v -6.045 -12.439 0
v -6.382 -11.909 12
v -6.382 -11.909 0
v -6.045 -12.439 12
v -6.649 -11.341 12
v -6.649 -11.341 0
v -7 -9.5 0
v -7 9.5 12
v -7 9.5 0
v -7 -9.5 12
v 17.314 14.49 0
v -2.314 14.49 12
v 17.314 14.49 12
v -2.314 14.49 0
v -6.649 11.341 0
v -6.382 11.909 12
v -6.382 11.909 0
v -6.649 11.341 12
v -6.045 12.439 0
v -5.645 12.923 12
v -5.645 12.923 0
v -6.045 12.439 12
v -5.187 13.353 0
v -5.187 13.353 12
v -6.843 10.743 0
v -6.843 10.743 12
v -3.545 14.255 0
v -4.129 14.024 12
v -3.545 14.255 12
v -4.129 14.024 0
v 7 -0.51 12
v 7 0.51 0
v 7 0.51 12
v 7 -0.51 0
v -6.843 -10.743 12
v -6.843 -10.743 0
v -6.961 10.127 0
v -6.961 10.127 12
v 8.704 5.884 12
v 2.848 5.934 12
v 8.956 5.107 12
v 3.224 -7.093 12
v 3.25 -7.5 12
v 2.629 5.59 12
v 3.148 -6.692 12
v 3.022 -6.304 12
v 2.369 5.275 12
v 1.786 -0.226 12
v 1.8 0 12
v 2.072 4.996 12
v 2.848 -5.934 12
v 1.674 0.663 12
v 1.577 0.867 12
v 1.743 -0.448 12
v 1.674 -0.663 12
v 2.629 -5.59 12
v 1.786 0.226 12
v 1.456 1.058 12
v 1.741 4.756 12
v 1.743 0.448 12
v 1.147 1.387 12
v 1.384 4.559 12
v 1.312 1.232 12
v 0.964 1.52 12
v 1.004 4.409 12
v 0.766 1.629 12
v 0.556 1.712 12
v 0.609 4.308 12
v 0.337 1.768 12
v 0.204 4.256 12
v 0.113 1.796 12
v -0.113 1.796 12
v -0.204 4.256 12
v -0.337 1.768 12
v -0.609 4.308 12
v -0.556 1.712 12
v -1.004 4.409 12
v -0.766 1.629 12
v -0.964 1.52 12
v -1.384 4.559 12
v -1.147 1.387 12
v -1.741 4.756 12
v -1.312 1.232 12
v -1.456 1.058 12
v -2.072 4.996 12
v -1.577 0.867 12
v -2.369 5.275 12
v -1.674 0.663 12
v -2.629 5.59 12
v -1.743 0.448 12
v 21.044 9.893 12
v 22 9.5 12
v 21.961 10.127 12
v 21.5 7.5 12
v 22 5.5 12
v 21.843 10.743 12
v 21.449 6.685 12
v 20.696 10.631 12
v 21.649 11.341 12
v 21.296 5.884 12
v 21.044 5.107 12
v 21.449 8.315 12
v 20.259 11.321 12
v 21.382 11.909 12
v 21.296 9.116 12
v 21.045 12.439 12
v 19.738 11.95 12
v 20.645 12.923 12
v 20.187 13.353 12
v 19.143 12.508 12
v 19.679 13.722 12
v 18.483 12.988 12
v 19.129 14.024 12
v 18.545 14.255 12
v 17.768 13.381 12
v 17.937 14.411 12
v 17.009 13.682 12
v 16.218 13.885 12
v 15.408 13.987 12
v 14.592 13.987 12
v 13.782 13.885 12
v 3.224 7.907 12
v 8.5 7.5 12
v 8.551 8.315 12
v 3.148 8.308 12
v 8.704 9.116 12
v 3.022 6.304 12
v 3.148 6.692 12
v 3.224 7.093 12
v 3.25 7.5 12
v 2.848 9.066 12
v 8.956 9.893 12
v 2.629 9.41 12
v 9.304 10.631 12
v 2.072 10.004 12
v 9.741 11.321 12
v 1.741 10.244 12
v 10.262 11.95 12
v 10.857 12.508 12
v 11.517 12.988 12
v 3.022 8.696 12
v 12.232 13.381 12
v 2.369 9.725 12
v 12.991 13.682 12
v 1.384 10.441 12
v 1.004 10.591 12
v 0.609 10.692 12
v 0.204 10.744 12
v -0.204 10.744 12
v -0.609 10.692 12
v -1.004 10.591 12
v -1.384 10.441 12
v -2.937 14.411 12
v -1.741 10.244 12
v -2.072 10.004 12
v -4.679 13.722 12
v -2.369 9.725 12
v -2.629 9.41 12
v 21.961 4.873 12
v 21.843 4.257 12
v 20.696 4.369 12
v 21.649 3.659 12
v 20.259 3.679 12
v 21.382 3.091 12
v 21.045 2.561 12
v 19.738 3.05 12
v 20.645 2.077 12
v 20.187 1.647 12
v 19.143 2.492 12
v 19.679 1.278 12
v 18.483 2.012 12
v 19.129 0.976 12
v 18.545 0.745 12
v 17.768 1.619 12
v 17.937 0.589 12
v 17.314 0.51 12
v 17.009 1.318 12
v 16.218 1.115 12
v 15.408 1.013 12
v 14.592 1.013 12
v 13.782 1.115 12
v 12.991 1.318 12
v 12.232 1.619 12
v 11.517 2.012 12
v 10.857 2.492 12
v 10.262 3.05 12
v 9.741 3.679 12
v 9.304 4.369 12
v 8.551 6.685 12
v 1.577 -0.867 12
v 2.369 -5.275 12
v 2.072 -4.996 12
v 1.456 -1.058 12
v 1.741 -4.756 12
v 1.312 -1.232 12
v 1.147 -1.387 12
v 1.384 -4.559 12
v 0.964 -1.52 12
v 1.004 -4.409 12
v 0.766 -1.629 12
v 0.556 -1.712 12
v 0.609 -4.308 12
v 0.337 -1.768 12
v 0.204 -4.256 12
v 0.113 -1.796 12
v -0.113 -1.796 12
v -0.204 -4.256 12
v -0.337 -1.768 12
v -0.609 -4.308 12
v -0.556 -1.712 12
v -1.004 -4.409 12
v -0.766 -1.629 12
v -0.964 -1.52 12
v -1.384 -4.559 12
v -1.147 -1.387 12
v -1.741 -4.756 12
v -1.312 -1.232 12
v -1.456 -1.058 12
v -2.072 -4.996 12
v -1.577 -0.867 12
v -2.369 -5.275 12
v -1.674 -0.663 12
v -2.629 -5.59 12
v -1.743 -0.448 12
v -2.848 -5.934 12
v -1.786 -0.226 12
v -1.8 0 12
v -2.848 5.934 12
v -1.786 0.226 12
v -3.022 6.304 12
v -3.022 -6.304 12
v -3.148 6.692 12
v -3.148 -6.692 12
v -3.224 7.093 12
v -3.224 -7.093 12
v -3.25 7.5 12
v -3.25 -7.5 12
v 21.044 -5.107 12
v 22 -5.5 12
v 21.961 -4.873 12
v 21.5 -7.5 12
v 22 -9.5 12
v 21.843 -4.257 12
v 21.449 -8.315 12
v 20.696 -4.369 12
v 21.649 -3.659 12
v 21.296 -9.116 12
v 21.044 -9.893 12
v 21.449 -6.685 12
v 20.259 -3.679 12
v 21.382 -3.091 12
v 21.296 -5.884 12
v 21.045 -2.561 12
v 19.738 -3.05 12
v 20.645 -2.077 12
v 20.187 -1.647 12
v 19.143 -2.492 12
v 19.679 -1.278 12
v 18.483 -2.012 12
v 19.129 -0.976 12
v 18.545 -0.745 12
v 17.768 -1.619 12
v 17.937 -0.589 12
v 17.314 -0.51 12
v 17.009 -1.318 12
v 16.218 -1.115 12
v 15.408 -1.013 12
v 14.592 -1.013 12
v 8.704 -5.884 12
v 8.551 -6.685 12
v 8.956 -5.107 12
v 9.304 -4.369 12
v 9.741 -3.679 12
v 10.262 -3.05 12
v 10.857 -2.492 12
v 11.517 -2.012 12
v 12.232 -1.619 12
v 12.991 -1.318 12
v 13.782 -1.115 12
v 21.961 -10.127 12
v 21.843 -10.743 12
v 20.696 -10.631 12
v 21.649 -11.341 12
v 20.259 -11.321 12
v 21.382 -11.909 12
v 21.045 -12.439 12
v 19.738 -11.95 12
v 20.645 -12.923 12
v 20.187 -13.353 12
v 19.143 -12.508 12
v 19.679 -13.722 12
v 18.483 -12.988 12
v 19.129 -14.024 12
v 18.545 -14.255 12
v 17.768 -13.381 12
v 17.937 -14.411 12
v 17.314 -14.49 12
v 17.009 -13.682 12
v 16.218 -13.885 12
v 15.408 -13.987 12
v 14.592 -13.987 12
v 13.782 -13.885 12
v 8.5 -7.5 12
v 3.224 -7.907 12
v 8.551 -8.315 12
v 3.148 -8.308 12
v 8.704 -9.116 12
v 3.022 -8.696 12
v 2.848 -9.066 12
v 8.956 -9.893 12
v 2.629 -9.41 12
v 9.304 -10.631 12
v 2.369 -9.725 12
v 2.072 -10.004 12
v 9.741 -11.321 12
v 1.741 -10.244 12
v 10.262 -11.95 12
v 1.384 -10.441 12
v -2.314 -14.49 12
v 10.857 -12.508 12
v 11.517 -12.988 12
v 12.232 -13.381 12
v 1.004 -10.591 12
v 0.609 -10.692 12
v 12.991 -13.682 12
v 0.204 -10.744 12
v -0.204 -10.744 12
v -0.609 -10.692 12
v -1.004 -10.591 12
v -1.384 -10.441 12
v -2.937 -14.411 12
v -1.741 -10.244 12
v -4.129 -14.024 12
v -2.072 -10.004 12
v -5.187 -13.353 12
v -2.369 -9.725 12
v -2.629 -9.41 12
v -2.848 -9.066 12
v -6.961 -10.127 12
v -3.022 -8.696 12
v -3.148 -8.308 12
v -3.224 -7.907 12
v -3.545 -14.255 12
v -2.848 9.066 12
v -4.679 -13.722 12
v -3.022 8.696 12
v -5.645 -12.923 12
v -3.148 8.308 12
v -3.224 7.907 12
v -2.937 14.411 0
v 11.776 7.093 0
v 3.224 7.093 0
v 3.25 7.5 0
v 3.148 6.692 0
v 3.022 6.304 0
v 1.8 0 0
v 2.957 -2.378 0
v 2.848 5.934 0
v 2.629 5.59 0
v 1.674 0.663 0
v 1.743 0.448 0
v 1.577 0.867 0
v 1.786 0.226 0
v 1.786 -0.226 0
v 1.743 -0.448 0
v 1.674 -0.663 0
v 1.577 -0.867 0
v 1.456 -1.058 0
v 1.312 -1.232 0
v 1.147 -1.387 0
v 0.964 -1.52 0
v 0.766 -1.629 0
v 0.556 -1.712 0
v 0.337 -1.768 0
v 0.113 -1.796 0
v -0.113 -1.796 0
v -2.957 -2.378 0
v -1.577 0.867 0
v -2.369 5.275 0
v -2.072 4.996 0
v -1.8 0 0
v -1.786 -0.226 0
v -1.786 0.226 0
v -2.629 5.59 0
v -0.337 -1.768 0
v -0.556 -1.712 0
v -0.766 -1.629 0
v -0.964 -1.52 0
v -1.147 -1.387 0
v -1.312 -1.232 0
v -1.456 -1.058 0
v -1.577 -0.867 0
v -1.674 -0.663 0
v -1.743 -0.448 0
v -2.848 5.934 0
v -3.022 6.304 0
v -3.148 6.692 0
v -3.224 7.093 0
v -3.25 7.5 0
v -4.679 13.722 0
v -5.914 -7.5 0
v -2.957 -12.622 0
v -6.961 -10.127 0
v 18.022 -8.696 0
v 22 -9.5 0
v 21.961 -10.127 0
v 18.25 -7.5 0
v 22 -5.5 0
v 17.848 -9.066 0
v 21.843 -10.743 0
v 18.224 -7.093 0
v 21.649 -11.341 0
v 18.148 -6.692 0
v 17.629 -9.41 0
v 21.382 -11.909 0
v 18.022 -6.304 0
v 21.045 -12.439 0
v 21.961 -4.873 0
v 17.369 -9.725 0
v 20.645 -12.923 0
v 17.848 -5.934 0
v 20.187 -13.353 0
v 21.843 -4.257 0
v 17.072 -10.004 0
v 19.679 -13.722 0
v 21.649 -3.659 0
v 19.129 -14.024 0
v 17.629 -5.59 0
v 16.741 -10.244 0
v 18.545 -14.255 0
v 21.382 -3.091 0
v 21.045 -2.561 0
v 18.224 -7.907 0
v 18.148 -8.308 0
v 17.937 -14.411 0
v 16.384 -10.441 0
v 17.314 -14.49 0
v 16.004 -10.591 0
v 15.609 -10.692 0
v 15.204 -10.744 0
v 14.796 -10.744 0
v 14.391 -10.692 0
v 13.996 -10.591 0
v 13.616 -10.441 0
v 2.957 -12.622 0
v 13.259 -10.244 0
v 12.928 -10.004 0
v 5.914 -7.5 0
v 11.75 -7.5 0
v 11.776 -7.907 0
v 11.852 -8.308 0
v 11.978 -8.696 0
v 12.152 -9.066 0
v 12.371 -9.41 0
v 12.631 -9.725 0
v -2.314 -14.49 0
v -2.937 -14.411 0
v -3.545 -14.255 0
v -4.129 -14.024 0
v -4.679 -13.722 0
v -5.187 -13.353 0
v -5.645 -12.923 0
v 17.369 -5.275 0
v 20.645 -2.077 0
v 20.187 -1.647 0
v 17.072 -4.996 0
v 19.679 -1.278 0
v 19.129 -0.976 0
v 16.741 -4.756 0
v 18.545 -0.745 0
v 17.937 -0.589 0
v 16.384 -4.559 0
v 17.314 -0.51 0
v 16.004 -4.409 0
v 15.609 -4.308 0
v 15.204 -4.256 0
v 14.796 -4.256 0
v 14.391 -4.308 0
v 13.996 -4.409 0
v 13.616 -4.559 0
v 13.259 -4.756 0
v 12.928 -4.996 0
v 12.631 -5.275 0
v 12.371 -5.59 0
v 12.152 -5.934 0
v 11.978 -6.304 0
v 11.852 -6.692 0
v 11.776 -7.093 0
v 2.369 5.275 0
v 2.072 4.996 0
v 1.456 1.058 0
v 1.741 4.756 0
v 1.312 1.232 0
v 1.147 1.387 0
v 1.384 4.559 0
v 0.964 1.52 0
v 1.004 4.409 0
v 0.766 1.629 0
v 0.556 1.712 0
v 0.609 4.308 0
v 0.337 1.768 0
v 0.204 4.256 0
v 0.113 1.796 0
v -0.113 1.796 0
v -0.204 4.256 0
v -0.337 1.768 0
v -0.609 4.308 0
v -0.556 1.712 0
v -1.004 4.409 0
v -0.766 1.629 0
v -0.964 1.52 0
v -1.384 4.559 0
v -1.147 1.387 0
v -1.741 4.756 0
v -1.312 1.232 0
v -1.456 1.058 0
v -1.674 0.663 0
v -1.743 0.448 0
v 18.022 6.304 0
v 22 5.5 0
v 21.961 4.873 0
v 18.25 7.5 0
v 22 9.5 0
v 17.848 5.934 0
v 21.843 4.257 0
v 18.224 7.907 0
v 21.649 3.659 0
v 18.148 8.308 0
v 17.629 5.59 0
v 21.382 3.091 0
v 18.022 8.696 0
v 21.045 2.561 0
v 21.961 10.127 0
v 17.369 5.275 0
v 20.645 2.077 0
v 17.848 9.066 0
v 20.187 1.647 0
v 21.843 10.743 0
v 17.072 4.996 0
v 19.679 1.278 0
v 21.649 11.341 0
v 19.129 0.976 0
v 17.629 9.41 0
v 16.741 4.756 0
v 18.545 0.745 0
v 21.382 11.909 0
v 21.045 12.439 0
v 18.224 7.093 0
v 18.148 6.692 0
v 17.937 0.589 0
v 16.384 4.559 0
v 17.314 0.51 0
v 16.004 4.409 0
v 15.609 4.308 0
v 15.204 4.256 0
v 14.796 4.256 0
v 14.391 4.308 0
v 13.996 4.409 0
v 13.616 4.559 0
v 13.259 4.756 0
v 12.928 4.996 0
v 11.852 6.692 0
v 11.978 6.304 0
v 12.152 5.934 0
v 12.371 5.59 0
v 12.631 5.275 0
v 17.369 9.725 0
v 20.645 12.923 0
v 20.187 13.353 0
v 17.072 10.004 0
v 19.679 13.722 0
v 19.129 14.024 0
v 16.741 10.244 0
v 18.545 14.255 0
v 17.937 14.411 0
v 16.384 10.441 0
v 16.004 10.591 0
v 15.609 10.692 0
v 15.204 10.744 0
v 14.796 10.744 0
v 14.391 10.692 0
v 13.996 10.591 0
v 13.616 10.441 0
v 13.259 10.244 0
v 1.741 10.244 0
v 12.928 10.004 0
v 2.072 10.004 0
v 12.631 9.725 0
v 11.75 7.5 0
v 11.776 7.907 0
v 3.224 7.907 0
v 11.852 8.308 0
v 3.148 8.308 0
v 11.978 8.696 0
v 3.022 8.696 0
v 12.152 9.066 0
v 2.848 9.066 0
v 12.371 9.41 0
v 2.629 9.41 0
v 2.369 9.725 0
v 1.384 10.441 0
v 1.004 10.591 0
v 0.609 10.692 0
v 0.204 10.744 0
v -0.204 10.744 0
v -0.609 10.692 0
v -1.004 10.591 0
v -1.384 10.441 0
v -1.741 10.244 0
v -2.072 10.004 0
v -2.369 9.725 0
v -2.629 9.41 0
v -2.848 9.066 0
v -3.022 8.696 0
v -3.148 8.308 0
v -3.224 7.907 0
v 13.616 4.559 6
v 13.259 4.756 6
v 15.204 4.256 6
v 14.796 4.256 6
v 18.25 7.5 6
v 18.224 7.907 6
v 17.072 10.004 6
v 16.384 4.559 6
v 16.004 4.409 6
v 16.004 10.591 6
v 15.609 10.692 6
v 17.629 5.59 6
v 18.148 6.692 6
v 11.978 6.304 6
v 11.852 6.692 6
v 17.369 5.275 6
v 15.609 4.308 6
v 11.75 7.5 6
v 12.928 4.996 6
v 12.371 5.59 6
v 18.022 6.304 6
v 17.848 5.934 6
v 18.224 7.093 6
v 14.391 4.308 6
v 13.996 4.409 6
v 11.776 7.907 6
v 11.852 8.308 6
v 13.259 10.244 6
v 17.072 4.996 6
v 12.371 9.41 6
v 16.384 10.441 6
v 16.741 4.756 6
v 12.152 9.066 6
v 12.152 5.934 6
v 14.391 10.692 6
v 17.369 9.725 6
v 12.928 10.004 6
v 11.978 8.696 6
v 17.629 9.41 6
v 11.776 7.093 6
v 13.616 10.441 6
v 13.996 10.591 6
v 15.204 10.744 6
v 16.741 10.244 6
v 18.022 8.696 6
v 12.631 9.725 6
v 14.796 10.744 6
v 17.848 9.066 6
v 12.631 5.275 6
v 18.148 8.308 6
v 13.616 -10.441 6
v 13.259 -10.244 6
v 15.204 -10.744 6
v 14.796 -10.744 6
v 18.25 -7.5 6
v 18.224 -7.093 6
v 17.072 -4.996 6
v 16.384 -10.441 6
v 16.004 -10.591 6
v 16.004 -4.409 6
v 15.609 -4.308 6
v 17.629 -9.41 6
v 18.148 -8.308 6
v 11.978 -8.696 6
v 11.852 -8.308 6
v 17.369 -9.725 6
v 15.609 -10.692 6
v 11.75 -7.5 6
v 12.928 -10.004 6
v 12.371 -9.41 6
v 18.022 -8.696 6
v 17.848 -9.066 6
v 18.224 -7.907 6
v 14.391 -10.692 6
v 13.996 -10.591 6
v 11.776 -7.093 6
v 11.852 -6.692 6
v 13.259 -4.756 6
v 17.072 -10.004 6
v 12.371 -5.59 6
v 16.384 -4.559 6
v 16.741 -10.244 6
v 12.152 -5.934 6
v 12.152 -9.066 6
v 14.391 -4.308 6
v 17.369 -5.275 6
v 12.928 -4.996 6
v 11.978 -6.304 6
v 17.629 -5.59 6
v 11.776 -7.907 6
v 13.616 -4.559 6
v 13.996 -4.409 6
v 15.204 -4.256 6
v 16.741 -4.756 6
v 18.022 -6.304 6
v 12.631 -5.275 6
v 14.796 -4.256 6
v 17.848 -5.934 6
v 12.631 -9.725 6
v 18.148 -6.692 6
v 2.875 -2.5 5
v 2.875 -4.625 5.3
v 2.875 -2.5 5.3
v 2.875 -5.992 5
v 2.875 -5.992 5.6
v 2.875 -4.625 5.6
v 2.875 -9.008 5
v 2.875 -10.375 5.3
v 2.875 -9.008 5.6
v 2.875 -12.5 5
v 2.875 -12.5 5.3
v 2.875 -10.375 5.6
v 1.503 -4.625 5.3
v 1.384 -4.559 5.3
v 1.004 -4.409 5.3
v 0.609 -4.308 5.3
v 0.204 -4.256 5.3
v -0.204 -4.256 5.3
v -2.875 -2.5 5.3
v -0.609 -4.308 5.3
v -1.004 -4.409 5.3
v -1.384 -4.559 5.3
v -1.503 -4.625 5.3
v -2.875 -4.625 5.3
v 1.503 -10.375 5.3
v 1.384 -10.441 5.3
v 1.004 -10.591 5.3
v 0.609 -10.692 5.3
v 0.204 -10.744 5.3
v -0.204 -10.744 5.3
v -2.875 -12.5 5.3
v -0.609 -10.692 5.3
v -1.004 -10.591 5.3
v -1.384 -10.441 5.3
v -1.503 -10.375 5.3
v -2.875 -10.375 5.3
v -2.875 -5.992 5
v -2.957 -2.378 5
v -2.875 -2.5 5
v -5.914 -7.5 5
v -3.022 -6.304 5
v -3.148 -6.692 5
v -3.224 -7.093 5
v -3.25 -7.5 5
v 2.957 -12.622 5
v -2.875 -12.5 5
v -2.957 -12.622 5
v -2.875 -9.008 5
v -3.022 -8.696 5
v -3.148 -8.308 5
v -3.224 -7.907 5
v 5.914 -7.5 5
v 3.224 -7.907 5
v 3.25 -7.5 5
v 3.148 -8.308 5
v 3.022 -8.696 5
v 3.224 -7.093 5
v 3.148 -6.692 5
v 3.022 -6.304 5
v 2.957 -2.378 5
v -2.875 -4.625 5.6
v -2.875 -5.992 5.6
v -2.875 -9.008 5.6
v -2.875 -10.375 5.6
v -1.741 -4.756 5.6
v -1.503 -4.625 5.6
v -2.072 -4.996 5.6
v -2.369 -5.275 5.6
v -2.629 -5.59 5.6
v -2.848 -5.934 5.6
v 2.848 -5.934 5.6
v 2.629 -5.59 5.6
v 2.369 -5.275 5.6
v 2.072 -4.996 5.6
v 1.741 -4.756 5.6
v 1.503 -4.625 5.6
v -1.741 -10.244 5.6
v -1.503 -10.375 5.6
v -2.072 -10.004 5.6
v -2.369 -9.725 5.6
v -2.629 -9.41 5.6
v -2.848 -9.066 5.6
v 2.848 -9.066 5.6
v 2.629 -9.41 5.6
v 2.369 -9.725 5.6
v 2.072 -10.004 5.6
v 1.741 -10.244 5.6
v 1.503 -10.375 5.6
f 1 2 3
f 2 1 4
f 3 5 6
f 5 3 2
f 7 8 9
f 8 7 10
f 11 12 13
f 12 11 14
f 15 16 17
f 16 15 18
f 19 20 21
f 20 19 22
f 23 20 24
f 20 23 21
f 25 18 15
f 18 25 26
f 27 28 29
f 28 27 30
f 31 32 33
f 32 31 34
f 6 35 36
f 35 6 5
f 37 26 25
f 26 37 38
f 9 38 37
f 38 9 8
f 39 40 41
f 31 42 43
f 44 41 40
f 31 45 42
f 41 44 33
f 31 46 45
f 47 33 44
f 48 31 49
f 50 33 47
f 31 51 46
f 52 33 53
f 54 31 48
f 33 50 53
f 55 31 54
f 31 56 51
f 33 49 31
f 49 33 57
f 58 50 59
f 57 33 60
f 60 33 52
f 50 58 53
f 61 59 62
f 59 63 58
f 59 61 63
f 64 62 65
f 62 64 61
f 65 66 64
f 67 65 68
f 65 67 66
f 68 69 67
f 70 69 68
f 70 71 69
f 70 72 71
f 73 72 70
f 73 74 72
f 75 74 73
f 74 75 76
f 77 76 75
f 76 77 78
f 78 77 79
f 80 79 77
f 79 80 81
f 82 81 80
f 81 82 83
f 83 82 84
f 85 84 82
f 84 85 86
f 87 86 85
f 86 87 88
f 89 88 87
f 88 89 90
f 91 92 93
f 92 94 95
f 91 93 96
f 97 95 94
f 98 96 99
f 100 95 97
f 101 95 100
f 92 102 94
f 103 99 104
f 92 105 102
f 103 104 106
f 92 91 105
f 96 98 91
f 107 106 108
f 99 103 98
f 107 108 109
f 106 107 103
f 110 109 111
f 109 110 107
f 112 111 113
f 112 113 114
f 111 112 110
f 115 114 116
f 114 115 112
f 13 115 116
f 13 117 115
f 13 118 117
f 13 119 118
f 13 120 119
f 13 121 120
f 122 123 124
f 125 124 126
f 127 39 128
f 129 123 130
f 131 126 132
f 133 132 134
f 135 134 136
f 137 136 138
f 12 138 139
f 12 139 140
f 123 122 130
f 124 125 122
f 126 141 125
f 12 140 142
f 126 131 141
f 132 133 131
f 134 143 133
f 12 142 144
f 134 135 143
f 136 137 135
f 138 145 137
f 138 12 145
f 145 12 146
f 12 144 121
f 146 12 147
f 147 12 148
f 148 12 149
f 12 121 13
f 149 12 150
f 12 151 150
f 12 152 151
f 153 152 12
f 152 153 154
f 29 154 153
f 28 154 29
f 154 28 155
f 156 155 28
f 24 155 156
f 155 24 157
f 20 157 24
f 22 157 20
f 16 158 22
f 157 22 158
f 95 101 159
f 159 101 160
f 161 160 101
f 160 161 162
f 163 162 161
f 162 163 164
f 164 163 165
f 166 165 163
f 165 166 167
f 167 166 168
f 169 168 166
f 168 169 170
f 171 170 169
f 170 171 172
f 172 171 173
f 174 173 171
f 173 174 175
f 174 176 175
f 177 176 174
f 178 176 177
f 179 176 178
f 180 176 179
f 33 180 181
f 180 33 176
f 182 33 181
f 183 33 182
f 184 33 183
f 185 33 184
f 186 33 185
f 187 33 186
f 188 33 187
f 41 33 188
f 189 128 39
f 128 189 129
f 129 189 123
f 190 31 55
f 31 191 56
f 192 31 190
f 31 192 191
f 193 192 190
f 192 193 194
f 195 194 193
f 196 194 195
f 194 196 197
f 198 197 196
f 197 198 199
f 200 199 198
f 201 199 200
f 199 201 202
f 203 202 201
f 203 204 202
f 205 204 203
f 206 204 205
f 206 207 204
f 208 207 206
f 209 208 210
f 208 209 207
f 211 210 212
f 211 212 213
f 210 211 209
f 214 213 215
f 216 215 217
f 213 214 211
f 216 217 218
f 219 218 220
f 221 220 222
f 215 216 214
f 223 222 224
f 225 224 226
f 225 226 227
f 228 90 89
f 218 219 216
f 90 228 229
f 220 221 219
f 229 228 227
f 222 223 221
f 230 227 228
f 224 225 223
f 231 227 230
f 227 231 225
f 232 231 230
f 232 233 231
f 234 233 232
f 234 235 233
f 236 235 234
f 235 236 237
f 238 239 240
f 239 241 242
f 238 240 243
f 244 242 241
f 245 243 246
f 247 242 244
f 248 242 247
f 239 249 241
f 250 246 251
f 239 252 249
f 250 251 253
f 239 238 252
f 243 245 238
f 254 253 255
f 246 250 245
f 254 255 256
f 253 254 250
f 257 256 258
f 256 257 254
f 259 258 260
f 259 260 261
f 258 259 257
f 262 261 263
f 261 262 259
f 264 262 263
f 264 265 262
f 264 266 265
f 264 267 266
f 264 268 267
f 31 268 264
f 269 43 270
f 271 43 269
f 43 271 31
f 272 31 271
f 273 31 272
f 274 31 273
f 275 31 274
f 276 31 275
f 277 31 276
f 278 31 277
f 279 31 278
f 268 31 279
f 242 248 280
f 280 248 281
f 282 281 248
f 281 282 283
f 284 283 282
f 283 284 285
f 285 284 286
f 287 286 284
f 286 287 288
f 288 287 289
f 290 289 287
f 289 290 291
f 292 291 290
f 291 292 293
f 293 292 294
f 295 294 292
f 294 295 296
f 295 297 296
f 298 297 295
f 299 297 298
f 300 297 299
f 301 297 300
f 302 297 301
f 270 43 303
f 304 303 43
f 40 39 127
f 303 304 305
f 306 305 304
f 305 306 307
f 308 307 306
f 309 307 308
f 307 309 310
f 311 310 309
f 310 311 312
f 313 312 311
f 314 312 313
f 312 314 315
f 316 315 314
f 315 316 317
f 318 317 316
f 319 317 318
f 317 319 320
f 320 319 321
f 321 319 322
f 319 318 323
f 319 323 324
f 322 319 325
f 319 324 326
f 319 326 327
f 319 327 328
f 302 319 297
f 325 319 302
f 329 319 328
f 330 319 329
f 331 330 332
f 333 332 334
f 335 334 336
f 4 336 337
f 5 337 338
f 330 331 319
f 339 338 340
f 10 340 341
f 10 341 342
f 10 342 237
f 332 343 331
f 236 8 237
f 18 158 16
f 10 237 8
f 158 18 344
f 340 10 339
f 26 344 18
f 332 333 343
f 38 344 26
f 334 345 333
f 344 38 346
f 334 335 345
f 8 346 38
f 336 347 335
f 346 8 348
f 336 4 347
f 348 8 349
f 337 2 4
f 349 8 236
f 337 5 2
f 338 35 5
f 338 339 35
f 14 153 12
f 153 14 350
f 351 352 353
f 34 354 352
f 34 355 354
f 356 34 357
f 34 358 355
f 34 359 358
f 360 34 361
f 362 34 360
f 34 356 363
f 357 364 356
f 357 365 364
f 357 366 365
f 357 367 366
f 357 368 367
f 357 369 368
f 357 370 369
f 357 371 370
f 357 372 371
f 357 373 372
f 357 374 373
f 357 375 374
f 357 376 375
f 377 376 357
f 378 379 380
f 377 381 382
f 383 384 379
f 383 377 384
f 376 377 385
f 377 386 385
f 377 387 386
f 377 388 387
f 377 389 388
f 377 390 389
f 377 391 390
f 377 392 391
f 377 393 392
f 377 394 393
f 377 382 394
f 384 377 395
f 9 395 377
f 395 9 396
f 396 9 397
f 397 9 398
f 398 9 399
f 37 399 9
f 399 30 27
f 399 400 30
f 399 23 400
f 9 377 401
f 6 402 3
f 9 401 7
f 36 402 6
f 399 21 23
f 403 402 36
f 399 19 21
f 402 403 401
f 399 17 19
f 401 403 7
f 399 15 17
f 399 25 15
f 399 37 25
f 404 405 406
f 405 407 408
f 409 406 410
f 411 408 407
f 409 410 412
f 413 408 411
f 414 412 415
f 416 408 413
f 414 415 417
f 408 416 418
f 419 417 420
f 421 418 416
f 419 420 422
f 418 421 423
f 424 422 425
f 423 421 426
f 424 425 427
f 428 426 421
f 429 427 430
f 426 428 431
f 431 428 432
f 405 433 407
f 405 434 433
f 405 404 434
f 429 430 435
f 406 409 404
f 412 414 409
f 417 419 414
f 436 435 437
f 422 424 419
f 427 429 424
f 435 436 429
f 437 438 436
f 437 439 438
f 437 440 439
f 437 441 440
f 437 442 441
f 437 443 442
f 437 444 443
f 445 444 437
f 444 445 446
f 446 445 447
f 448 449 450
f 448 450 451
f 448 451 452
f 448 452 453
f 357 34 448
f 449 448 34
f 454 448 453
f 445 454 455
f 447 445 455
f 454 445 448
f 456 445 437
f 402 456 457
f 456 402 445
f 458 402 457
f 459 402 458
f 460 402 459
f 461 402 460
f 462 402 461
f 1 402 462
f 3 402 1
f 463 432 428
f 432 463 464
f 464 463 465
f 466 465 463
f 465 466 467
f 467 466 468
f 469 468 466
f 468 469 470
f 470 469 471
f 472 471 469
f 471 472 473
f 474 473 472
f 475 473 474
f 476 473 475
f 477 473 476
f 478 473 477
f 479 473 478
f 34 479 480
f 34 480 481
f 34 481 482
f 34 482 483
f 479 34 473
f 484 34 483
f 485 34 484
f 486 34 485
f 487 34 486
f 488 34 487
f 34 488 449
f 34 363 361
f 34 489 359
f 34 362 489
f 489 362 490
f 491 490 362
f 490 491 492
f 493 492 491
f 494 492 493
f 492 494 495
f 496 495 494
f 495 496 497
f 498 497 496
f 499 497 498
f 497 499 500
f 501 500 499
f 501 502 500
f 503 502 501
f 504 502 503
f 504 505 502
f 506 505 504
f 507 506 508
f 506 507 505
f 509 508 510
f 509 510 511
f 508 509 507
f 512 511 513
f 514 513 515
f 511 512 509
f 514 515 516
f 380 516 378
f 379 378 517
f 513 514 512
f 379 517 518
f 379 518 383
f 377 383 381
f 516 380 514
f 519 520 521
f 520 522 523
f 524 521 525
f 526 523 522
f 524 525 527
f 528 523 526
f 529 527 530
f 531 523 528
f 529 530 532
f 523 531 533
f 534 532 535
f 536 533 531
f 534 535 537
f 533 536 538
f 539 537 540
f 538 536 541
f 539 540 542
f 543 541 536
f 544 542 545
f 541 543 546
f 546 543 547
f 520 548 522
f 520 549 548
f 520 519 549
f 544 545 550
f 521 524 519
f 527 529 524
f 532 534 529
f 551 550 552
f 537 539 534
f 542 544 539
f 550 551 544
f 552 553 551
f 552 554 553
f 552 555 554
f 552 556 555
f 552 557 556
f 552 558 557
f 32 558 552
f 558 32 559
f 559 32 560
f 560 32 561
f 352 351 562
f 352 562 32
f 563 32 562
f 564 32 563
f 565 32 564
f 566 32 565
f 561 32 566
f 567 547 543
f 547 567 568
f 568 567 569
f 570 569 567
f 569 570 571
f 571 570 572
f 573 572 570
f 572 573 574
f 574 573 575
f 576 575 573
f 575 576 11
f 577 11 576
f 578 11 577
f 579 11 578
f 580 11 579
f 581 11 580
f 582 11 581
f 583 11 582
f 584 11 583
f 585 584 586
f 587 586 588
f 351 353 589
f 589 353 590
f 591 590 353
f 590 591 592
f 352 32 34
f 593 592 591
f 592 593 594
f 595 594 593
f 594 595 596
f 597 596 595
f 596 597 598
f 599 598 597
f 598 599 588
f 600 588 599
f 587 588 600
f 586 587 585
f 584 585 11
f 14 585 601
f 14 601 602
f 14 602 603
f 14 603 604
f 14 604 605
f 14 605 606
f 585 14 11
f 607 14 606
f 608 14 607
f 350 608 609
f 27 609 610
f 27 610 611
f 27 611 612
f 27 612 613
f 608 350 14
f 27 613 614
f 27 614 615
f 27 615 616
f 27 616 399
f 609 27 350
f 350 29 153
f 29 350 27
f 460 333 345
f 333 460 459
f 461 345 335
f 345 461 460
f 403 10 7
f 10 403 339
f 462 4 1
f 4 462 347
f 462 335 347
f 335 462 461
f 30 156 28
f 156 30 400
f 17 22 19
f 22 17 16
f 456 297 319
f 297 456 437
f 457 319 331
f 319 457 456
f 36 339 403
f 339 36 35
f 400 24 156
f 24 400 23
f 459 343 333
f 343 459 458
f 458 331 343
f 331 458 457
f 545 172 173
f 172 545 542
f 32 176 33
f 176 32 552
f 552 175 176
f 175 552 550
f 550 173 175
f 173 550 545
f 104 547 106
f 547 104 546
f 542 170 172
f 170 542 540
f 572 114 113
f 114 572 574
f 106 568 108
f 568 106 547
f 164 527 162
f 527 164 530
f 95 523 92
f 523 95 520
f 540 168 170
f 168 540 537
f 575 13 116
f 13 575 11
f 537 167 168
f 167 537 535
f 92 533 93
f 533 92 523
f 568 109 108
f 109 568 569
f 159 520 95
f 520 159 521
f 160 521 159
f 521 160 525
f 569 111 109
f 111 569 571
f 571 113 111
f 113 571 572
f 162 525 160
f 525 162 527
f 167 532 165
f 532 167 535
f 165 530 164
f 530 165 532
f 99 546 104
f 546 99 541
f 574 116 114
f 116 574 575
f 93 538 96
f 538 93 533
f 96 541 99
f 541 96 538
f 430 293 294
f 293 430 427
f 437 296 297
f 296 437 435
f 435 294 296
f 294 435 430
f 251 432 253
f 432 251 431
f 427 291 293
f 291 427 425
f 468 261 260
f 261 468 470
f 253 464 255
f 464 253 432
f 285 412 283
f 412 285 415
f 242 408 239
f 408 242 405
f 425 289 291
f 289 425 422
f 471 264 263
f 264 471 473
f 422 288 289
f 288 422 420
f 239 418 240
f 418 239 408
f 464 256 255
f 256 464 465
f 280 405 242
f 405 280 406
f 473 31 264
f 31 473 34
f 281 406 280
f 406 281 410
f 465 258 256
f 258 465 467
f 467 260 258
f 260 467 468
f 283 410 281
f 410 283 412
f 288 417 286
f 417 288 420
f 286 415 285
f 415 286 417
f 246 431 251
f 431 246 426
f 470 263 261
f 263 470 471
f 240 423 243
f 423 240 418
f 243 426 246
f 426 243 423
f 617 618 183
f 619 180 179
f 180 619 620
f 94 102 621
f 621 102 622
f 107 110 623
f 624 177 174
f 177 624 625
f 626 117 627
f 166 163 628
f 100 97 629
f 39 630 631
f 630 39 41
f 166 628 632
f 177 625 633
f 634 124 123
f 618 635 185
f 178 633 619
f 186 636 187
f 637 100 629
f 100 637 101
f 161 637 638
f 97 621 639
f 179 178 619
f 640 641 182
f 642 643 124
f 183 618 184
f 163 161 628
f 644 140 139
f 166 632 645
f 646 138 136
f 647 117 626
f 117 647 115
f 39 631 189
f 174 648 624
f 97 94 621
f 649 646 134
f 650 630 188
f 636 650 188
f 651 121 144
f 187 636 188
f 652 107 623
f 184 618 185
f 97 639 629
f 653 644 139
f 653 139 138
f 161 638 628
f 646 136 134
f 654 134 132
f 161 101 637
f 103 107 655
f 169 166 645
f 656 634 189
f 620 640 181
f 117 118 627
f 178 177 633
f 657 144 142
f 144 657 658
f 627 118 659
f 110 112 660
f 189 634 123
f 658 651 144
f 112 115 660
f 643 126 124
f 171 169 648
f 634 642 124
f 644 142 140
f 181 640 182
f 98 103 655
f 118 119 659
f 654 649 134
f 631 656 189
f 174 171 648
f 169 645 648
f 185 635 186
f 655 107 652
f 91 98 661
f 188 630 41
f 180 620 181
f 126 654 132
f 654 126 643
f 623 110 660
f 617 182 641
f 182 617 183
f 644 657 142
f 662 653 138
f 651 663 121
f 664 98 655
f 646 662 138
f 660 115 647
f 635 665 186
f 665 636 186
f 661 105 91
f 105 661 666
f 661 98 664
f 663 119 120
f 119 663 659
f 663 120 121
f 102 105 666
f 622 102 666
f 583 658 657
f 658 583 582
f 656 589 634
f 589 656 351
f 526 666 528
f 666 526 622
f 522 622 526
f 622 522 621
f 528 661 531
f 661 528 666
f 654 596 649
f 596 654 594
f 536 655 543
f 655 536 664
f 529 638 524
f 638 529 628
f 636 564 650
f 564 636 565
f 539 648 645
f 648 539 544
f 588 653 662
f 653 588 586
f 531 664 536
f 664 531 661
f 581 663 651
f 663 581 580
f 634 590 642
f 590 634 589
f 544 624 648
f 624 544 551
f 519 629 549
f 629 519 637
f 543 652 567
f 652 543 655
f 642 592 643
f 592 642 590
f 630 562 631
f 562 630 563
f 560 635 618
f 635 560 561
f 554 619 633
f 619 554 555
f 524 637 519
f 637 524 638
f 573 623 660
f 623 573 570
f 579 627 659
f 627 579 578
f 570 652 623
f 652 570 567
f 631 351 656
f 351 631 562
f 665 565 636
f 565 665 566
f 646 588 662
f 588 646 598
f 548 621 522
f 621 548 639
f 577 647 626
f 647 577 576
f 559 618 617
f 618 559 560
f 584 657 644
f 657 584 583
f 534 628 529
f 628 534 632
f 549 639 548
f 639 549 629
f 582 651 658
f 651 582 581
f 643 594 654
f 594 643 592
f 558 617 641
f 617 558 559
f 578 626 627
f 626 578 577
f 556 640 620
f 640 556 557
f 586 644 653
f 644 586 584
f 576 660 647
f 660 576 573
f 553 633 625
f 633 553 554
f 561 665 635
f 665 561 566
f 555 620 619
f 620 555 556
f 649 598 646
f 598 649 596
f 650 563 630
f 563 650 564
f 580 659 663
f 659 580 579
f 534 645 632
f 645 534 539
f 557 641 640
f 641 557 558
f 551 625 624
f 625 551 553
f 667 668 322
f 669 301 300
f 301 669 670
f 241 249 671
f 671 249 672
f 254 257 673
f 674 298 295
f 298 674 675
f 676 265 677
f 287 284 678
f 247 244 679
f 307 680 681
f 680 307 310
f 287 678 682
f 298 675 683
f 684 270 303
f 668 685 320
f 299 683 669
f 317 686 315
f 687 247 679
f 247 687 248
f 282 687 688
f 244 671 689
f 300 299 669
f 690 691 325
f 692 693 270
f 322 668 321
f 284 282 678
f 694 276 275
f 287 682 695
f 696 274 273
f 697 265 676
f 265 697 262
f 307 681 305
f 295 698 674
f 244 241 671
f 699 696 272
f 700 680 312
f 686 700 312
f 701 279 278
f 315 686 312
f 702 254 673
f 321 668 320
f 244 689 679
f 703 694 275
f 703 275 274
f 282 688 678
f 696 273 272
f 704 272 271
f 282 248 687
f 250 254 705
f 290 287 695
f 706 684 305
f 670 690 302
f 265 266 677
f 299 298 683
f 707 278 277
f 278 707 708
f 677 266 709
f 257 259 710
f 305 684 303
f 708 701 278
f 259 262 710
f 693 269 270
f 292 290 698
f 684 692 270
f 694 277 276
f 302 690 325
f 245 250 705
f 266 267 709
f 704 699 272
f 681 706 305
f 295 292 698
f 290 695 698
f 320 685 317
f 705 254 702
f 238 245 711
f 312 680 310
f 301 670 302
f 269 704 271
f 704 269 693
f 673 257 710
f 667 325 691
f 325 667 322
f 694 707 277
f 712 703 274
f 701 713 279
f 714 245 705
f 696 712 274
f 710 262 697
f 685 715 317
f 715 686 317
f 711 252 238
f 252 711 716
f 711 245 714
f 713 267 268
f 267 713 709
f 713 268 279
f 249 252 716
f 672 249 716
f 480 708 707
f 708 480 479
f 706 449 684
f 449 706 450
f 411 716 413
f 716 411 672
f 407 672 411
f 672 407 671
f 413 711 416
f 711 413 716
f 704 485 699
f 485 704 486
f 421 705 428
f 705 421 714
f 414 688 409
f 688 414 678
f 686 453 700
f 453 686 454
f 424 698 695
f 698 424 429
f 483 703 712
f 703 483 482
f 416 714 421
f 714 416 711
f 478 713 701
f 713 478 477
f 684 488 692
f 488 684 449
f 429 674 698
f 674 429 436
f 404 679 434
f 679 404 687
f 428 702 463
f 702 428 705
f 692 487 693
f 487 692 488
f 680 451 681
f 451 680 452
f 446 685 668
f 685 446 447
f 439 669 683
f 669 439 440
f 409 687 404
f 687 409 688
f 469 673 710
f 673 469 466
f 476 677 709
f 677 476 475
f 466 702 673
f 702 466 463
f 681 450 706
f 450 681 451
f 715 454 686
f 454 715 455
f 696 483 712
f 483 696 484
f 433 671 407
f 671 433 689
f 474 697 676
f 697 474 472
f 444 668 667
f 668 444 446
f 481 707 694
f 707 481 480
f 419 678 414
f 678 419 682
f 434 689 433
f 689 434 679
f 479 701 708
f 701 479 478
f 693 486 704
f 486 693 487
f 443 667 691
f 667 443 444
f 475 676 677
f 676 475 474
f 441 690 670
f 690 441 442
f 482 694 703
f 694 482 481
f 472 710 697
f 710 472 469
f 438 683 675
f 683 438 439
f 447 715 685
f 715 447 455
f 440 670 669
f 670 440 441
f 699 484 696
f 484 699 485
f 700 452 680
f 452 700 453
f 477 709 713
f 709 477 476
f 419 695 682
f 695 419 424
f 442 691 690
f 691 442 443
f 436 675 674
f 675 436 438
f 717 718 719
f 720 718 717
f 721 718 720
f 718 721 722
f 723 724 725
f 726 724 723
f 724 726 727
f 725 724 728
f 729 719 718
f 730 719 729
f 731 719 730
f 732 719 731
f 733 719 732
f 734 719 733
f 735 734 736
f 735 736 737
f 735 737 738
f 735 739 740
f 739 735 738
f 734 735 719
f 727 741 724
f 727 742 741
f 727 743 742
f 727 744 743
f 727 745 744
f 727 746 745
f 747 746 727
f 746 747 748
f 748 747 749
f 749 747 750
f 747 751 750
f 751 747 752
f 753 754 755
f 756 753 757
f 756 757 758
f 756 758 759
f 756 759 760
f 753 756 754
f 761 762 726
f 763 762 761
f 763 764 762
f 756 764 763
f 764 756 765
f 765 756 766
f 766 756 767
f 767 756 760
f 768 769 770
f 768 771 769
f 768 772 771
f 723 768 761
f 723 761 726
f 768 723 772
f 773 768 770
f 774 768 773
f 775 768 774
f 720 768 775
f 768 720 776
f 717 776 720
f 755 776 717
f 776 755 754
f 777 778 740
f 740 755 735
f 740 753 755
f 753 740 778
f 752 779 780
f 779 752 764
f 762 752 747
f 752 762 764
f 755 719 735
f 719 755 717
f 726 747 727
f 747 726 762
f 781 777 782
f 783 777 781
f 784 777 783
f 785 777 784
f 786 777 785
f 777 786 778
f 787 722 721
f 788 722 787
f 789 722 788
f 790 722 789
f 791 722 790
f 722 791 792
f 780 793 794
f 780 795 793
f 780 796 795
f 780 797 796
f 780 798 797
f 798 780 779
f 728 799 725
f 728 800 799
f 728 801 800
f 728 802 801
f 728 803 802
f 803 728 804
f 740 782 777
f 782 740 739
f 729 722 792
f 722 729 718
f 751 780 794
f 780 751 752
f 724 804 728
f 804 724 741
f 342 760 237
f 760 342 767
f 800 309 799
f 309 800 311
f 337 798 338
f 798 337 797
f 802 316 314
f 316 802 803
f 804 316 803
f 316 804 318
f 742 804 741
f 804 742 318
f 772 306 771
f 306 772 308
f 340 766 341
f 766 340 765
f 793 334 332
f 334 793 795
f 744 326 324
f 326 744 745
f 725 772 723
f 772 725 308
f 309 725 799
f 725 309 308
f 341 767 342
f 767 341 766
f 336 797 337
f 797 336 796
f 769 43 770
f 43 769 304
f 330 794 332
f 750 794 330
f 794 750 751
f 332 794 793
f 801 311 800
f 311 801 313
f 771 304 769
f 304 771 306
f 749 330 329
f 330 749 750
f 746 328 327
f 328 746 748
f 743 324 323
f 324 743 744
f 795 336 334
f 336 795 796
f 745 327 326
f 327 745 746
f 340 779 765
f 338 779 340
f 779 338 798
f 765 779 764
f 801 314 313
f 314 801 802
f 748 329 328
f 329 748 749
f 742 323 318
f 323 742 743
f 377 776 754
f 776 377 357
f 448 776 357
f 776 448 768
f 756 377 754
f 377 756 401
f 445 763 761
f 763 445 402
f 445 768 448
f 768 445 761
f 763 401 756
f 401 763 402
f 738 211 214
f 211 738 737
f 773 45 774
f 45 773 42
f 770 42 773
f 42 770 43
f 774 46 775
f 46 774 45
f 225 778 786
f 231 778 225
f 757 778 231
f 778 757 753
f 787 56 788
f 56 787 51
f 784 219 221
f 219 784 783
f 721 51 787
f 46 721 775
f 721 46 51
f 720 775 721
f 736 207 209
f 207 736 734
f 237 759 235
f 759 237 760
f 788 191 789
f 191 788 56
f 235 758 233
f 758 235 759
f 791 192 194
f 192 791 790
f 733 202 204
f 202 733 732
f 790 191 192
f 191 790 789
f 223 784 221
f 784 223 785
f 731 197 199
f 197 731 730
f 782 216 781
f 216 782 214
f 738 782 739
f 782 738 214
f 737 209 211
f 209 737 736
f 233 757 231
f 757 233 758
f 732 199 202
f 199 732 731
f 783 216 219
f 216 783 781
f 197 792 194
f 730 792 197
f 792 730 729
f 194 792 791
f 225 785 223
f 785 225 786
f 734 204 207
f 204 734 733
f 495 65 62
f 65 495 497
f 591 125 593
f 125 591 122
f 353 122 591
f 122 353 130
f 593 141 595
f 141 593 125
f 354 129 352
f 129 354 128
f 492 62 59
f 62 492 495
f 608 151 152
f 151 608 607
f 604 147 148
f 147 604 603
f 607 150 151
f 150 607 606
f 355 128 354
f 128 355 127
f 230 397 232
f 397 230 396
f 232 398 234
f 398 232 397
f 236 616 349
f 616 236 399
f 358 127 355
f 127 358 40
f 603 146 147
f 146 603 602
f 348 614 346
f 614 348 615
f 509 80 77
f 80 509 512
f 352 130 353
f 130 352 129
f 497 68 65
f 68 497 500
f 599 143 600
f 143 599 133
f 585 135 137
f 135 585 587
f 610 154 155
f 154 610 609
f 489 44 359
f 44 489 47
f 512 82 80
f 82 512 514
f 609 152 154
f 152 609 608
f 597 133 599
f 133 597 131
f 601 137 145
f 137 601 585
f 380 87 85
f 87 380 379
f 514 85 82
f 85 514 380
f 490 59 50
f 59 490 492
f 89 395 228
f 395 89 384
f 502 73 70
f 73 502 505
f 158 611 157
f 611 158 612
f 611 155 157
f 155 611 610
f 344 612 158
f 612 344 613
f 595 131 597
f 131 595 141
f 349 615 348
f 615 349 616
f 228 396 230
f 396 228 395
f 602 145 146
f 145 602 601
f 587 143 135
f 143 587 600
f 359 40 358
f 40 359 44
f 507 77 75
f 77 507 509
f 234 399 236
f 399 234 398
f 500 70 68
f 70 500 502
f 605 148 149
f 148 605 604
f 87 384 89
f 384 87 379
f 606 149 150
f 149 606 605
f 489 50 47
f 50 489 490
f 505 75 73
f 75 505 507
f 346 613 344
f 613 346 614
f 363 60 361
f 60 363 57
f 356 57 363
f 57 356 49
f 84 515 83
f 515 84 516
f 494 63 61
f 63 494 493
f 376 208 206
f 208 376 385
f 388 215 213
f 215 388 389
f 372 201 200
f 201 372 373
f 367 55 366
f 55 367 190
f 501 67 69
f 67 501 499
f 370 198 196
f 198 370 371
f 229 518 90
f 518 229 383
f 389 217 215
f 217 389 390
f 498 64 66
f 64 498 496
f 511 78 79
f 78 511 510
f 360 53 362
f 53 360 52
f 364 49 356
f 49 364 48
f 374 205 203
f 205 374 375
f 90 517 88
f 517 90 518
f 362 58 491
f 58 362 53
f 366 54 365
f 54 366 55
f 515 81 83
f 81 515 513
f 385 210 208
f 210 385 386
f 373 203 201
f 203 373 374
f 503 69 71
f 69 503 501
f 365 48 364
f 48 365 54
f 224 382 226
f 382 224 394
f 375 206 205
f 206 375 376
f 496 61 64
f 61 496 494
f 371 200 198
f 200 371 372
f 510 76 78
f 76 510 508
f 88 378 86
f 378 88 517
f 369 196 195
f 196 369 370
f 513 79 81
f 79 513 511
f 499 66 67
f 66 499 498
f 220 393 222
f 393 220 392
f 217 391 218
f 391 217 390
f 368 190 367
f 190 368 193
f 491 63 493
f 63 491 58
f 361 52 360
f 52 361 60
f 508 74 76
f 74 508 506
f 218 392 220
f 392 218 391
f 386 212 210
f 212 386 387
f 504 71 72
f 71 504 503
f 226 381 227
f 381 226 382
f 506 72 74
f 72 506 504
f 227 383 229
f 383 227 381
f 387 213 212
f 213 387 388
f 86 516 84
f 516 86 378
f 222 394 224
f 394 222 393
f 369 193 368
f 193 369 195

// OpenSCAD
$fn = 50;


difference() {
	union() {
		hull() {
			translate(v = [-2.0000000000, 9.5000000000, 0]) {
				cylinder(h = 12, r = 5);
			}
			translate(v = [2.0000000000, 9.5000000000, 0]) {
				cylinder(h = 12, r = 5);
			}
			translate(v = [-2.0000000000, -9.5000000000, 0]) {
				cylinder(h = 12, r = 5);
			}
			translate(v = [2.0000000000, -9.5000000000, 0]) {
				cylinder(h = 12, r = 5);
			}
		}
		translate(v = [7.5000000000, 7.5000000000, 0]) {
			hull() {
				translate(v = [-9.5000000000, 2.0000000000, 0]) {
					cylinder(h = 12, r = 5);
				}
				translate(v = [9.5000000000, 2.0000000000, 0]) {
					cylinder(h = 12, r = 5);
				}
				translate(v = [-9.5000000000, -2.0000000000, 0]) {
					cylinder(h = 12, r = 5);
				}
				translate(v = [9.5000000000, -2.0000000000, 0]) {
					cylinder(h = 12, r = 5);
				}
			}
		}
		translate(v = [7.5000000000, -7.5000000000, 0]) {
			hull() {
				translate(v = [-9.5000000000, 2.0000000000, 0]) {
					cylinder(h = 12, r = 5);
				}
				translate(v = [9.5000000000, 2.0000000000, 0]) {
					cylinder(h = 12, r = 5);
				}
				translate(v = [-9.5000000000, -2.0000000000, 0]) {
					cylinder(h = 12, r = 5);
				}
				translate(v = [9.5000000000, -2.0000000000, 0]) {
					cylinder(h = 12, r = 5);
				}
			}
		}
	}
	union() {
		translate(v = [15.0000000000, 7.5000000000, 12]) {
			rotate(a = [0, 0, 0]) {
				difference() {
					union() {
						#translate(v = [0, 0, -12.0000000000]) {
							cylinder(h = 12, r = 2.2500000000);
						}
						#translate(v = [0, 0, -6]) {
							cylinder(h = 6, r1 = 3.2500000000, r2 = 6.5000000000);
						}
						#translate(v = [0, 0, -12.0000000000]) {
							cylinder(h = 12, r = 3.2500000000);
						}
						#translate(v = [0, 0, -12.0000000000]) {
							cylinder(h = 12, r = 2.2500000000);
						}
					}
					union();
				}
			}
		}
		translate(v = [15.0000000000, -7.5000000000, 12]) {
			rotate(a = [0, 0, 0]) {
				difference() {
					union() {
						#translate(v = [0, 0, -12.0000000000]) {
							cylinder(h = 12, r = 2.2500000000);
						}
						#translate(v = [0, 0, -6]) {
							cylinder(h = 6, r1 = 3.2500000000, r2 = 6.5000000000);
						}
						#translate(v = [0, 0, -12.0000000000]) {
							cylinder(h = 12, r = 3.2500000000);
						}
						#translate(v = [0, 0, -12.0000000000]) {
							cylinder(h = 12, r = 2.2500000000);
						}
					}
					union();
				}
			}
		}
		translate(v = [0.0000000000, -7.5000000000, 0]) {
			rotate(a = [0, 0, 0]) {
				difference() {
					union() {
						#translate(v = [-2.8750000000, -5.0000000000, -0.3000000000]) {
							cube(size = [5.7500000000, 10, 0.3000000000]);
						}
						#translate(v = [-2.8750000000, -2.8750000000, -0.6000000000]) {
							cube(size = [5.7500000000, 5.7500000000, 0.3000000000]);
						}
						#translate(v = [-2.8750000000, -5.0000000000, 5]) {
							cube(size = [5.7500000000, 10, 0.3000000000]);
						}
						#translate(v = [-2.8750000000, -2.8750000000, 5.3000000000]) {
							cube(size = [5.7500000000, 5.7500000000, 0.3000000000]);
						}
						#translate(v = [0, 0, -100.0000000000]) {
							cylinder(h = 200, r = 3.2500000000);
						}
						#linear_extrude(height = 5) {
							polygon(points = [[5.9142500000, 0.0000000000], [2.9571250000, 5.1218907443], [-2.9571250000, 5.1218907443], [-5.9142500000, 0.0000000000], [-2.9571250000, -5.1218907443], [2.9571250000, -5.1218907443]]);
						}
						#translate(v = [-2.8750000000, -5.0000000000, -0.3000000000]) {
							cube(size = [5.7500000000, 10, 0.3000000000]);
						}
						#translate(v = [-2.8750000000, -2.8750000000, -0.6000000000]) {
							cube(size = [5.7500000000, 5.7500000000, 0.3000000000]);
						}
						#translate(v = [-2.8750000000, -5.0000000000, 5]) {
							cube(size = [5.7500000000, 10, 0.3000000000]);
						}
						#translate(v = [-2.8750000000, -2.8750000000, 5.3000000000]) {
							cube(size = [5.7500000000, 5.7500000000, 0.3000000000]);
						}
						#translate(v = [0, 0, -100.0000000000]) {
							cylinder(h = 200, r = 3.2500000000);
						}
						#translate(v = [-2.8750000000, -5.0000000000, -0.3000000000]) {
							cube(size = [5.7500000000, 10, 0.3000000000]);
						}
						#translate(v = [-2.8750000000, -2.8750000000, -0.6000000000]) {
							cube(size = [5.7500000000, 5.7500000000, 0.3000000000]);
						}
						#translate(v = [-2.8750000000, -5.0000000000, 5]) {
							cube(size = [5.7500000000, 10, 0.3000000000]);
						}
						#translate(v = [-2.8750000000, -2.8750000000, 5.3000000000]) {
							cube(size = [5.7500000000, 5.7500000000, 0.3000000000]);
						}
						#translate(v = [0, 0, -100.0000000000]) {
							cylinder(h = 200, r = 3.2500000000);
						}
					}
					union();
				}
			}
		}
		translate(v = [0.0000000000, -7.5000000000, 0]) {
			translate(v = [0, 0, -100]) {
				cylinder(h = 200, r = 3.2500000000);
			}
		}
		translate(v = [0.0000000000, 7.5000000000, 0]) {
			translate(v = [0, 0, -100]) {
				cylinder(h = 200, r = 3.2500000000);
			}
		}
		translate(v = [0.0000000000, -7.5000000000, 0]) {
			translate(v = [0, 0, -100]) {
				cylinder(h = 200, r = 1.8000000000);
			}
		}
		translate(v = [0, 0, -100]) {
			cylinder(h = 200, r = 1.8000000000);
		}
		translate(v = [0.0000000000, 7.5000000000, 0]) {
			translate(v = [0, 0, -100]) {
				cylinder(h = 200, r = 1.8000000000);
			}
		}
	}
}
